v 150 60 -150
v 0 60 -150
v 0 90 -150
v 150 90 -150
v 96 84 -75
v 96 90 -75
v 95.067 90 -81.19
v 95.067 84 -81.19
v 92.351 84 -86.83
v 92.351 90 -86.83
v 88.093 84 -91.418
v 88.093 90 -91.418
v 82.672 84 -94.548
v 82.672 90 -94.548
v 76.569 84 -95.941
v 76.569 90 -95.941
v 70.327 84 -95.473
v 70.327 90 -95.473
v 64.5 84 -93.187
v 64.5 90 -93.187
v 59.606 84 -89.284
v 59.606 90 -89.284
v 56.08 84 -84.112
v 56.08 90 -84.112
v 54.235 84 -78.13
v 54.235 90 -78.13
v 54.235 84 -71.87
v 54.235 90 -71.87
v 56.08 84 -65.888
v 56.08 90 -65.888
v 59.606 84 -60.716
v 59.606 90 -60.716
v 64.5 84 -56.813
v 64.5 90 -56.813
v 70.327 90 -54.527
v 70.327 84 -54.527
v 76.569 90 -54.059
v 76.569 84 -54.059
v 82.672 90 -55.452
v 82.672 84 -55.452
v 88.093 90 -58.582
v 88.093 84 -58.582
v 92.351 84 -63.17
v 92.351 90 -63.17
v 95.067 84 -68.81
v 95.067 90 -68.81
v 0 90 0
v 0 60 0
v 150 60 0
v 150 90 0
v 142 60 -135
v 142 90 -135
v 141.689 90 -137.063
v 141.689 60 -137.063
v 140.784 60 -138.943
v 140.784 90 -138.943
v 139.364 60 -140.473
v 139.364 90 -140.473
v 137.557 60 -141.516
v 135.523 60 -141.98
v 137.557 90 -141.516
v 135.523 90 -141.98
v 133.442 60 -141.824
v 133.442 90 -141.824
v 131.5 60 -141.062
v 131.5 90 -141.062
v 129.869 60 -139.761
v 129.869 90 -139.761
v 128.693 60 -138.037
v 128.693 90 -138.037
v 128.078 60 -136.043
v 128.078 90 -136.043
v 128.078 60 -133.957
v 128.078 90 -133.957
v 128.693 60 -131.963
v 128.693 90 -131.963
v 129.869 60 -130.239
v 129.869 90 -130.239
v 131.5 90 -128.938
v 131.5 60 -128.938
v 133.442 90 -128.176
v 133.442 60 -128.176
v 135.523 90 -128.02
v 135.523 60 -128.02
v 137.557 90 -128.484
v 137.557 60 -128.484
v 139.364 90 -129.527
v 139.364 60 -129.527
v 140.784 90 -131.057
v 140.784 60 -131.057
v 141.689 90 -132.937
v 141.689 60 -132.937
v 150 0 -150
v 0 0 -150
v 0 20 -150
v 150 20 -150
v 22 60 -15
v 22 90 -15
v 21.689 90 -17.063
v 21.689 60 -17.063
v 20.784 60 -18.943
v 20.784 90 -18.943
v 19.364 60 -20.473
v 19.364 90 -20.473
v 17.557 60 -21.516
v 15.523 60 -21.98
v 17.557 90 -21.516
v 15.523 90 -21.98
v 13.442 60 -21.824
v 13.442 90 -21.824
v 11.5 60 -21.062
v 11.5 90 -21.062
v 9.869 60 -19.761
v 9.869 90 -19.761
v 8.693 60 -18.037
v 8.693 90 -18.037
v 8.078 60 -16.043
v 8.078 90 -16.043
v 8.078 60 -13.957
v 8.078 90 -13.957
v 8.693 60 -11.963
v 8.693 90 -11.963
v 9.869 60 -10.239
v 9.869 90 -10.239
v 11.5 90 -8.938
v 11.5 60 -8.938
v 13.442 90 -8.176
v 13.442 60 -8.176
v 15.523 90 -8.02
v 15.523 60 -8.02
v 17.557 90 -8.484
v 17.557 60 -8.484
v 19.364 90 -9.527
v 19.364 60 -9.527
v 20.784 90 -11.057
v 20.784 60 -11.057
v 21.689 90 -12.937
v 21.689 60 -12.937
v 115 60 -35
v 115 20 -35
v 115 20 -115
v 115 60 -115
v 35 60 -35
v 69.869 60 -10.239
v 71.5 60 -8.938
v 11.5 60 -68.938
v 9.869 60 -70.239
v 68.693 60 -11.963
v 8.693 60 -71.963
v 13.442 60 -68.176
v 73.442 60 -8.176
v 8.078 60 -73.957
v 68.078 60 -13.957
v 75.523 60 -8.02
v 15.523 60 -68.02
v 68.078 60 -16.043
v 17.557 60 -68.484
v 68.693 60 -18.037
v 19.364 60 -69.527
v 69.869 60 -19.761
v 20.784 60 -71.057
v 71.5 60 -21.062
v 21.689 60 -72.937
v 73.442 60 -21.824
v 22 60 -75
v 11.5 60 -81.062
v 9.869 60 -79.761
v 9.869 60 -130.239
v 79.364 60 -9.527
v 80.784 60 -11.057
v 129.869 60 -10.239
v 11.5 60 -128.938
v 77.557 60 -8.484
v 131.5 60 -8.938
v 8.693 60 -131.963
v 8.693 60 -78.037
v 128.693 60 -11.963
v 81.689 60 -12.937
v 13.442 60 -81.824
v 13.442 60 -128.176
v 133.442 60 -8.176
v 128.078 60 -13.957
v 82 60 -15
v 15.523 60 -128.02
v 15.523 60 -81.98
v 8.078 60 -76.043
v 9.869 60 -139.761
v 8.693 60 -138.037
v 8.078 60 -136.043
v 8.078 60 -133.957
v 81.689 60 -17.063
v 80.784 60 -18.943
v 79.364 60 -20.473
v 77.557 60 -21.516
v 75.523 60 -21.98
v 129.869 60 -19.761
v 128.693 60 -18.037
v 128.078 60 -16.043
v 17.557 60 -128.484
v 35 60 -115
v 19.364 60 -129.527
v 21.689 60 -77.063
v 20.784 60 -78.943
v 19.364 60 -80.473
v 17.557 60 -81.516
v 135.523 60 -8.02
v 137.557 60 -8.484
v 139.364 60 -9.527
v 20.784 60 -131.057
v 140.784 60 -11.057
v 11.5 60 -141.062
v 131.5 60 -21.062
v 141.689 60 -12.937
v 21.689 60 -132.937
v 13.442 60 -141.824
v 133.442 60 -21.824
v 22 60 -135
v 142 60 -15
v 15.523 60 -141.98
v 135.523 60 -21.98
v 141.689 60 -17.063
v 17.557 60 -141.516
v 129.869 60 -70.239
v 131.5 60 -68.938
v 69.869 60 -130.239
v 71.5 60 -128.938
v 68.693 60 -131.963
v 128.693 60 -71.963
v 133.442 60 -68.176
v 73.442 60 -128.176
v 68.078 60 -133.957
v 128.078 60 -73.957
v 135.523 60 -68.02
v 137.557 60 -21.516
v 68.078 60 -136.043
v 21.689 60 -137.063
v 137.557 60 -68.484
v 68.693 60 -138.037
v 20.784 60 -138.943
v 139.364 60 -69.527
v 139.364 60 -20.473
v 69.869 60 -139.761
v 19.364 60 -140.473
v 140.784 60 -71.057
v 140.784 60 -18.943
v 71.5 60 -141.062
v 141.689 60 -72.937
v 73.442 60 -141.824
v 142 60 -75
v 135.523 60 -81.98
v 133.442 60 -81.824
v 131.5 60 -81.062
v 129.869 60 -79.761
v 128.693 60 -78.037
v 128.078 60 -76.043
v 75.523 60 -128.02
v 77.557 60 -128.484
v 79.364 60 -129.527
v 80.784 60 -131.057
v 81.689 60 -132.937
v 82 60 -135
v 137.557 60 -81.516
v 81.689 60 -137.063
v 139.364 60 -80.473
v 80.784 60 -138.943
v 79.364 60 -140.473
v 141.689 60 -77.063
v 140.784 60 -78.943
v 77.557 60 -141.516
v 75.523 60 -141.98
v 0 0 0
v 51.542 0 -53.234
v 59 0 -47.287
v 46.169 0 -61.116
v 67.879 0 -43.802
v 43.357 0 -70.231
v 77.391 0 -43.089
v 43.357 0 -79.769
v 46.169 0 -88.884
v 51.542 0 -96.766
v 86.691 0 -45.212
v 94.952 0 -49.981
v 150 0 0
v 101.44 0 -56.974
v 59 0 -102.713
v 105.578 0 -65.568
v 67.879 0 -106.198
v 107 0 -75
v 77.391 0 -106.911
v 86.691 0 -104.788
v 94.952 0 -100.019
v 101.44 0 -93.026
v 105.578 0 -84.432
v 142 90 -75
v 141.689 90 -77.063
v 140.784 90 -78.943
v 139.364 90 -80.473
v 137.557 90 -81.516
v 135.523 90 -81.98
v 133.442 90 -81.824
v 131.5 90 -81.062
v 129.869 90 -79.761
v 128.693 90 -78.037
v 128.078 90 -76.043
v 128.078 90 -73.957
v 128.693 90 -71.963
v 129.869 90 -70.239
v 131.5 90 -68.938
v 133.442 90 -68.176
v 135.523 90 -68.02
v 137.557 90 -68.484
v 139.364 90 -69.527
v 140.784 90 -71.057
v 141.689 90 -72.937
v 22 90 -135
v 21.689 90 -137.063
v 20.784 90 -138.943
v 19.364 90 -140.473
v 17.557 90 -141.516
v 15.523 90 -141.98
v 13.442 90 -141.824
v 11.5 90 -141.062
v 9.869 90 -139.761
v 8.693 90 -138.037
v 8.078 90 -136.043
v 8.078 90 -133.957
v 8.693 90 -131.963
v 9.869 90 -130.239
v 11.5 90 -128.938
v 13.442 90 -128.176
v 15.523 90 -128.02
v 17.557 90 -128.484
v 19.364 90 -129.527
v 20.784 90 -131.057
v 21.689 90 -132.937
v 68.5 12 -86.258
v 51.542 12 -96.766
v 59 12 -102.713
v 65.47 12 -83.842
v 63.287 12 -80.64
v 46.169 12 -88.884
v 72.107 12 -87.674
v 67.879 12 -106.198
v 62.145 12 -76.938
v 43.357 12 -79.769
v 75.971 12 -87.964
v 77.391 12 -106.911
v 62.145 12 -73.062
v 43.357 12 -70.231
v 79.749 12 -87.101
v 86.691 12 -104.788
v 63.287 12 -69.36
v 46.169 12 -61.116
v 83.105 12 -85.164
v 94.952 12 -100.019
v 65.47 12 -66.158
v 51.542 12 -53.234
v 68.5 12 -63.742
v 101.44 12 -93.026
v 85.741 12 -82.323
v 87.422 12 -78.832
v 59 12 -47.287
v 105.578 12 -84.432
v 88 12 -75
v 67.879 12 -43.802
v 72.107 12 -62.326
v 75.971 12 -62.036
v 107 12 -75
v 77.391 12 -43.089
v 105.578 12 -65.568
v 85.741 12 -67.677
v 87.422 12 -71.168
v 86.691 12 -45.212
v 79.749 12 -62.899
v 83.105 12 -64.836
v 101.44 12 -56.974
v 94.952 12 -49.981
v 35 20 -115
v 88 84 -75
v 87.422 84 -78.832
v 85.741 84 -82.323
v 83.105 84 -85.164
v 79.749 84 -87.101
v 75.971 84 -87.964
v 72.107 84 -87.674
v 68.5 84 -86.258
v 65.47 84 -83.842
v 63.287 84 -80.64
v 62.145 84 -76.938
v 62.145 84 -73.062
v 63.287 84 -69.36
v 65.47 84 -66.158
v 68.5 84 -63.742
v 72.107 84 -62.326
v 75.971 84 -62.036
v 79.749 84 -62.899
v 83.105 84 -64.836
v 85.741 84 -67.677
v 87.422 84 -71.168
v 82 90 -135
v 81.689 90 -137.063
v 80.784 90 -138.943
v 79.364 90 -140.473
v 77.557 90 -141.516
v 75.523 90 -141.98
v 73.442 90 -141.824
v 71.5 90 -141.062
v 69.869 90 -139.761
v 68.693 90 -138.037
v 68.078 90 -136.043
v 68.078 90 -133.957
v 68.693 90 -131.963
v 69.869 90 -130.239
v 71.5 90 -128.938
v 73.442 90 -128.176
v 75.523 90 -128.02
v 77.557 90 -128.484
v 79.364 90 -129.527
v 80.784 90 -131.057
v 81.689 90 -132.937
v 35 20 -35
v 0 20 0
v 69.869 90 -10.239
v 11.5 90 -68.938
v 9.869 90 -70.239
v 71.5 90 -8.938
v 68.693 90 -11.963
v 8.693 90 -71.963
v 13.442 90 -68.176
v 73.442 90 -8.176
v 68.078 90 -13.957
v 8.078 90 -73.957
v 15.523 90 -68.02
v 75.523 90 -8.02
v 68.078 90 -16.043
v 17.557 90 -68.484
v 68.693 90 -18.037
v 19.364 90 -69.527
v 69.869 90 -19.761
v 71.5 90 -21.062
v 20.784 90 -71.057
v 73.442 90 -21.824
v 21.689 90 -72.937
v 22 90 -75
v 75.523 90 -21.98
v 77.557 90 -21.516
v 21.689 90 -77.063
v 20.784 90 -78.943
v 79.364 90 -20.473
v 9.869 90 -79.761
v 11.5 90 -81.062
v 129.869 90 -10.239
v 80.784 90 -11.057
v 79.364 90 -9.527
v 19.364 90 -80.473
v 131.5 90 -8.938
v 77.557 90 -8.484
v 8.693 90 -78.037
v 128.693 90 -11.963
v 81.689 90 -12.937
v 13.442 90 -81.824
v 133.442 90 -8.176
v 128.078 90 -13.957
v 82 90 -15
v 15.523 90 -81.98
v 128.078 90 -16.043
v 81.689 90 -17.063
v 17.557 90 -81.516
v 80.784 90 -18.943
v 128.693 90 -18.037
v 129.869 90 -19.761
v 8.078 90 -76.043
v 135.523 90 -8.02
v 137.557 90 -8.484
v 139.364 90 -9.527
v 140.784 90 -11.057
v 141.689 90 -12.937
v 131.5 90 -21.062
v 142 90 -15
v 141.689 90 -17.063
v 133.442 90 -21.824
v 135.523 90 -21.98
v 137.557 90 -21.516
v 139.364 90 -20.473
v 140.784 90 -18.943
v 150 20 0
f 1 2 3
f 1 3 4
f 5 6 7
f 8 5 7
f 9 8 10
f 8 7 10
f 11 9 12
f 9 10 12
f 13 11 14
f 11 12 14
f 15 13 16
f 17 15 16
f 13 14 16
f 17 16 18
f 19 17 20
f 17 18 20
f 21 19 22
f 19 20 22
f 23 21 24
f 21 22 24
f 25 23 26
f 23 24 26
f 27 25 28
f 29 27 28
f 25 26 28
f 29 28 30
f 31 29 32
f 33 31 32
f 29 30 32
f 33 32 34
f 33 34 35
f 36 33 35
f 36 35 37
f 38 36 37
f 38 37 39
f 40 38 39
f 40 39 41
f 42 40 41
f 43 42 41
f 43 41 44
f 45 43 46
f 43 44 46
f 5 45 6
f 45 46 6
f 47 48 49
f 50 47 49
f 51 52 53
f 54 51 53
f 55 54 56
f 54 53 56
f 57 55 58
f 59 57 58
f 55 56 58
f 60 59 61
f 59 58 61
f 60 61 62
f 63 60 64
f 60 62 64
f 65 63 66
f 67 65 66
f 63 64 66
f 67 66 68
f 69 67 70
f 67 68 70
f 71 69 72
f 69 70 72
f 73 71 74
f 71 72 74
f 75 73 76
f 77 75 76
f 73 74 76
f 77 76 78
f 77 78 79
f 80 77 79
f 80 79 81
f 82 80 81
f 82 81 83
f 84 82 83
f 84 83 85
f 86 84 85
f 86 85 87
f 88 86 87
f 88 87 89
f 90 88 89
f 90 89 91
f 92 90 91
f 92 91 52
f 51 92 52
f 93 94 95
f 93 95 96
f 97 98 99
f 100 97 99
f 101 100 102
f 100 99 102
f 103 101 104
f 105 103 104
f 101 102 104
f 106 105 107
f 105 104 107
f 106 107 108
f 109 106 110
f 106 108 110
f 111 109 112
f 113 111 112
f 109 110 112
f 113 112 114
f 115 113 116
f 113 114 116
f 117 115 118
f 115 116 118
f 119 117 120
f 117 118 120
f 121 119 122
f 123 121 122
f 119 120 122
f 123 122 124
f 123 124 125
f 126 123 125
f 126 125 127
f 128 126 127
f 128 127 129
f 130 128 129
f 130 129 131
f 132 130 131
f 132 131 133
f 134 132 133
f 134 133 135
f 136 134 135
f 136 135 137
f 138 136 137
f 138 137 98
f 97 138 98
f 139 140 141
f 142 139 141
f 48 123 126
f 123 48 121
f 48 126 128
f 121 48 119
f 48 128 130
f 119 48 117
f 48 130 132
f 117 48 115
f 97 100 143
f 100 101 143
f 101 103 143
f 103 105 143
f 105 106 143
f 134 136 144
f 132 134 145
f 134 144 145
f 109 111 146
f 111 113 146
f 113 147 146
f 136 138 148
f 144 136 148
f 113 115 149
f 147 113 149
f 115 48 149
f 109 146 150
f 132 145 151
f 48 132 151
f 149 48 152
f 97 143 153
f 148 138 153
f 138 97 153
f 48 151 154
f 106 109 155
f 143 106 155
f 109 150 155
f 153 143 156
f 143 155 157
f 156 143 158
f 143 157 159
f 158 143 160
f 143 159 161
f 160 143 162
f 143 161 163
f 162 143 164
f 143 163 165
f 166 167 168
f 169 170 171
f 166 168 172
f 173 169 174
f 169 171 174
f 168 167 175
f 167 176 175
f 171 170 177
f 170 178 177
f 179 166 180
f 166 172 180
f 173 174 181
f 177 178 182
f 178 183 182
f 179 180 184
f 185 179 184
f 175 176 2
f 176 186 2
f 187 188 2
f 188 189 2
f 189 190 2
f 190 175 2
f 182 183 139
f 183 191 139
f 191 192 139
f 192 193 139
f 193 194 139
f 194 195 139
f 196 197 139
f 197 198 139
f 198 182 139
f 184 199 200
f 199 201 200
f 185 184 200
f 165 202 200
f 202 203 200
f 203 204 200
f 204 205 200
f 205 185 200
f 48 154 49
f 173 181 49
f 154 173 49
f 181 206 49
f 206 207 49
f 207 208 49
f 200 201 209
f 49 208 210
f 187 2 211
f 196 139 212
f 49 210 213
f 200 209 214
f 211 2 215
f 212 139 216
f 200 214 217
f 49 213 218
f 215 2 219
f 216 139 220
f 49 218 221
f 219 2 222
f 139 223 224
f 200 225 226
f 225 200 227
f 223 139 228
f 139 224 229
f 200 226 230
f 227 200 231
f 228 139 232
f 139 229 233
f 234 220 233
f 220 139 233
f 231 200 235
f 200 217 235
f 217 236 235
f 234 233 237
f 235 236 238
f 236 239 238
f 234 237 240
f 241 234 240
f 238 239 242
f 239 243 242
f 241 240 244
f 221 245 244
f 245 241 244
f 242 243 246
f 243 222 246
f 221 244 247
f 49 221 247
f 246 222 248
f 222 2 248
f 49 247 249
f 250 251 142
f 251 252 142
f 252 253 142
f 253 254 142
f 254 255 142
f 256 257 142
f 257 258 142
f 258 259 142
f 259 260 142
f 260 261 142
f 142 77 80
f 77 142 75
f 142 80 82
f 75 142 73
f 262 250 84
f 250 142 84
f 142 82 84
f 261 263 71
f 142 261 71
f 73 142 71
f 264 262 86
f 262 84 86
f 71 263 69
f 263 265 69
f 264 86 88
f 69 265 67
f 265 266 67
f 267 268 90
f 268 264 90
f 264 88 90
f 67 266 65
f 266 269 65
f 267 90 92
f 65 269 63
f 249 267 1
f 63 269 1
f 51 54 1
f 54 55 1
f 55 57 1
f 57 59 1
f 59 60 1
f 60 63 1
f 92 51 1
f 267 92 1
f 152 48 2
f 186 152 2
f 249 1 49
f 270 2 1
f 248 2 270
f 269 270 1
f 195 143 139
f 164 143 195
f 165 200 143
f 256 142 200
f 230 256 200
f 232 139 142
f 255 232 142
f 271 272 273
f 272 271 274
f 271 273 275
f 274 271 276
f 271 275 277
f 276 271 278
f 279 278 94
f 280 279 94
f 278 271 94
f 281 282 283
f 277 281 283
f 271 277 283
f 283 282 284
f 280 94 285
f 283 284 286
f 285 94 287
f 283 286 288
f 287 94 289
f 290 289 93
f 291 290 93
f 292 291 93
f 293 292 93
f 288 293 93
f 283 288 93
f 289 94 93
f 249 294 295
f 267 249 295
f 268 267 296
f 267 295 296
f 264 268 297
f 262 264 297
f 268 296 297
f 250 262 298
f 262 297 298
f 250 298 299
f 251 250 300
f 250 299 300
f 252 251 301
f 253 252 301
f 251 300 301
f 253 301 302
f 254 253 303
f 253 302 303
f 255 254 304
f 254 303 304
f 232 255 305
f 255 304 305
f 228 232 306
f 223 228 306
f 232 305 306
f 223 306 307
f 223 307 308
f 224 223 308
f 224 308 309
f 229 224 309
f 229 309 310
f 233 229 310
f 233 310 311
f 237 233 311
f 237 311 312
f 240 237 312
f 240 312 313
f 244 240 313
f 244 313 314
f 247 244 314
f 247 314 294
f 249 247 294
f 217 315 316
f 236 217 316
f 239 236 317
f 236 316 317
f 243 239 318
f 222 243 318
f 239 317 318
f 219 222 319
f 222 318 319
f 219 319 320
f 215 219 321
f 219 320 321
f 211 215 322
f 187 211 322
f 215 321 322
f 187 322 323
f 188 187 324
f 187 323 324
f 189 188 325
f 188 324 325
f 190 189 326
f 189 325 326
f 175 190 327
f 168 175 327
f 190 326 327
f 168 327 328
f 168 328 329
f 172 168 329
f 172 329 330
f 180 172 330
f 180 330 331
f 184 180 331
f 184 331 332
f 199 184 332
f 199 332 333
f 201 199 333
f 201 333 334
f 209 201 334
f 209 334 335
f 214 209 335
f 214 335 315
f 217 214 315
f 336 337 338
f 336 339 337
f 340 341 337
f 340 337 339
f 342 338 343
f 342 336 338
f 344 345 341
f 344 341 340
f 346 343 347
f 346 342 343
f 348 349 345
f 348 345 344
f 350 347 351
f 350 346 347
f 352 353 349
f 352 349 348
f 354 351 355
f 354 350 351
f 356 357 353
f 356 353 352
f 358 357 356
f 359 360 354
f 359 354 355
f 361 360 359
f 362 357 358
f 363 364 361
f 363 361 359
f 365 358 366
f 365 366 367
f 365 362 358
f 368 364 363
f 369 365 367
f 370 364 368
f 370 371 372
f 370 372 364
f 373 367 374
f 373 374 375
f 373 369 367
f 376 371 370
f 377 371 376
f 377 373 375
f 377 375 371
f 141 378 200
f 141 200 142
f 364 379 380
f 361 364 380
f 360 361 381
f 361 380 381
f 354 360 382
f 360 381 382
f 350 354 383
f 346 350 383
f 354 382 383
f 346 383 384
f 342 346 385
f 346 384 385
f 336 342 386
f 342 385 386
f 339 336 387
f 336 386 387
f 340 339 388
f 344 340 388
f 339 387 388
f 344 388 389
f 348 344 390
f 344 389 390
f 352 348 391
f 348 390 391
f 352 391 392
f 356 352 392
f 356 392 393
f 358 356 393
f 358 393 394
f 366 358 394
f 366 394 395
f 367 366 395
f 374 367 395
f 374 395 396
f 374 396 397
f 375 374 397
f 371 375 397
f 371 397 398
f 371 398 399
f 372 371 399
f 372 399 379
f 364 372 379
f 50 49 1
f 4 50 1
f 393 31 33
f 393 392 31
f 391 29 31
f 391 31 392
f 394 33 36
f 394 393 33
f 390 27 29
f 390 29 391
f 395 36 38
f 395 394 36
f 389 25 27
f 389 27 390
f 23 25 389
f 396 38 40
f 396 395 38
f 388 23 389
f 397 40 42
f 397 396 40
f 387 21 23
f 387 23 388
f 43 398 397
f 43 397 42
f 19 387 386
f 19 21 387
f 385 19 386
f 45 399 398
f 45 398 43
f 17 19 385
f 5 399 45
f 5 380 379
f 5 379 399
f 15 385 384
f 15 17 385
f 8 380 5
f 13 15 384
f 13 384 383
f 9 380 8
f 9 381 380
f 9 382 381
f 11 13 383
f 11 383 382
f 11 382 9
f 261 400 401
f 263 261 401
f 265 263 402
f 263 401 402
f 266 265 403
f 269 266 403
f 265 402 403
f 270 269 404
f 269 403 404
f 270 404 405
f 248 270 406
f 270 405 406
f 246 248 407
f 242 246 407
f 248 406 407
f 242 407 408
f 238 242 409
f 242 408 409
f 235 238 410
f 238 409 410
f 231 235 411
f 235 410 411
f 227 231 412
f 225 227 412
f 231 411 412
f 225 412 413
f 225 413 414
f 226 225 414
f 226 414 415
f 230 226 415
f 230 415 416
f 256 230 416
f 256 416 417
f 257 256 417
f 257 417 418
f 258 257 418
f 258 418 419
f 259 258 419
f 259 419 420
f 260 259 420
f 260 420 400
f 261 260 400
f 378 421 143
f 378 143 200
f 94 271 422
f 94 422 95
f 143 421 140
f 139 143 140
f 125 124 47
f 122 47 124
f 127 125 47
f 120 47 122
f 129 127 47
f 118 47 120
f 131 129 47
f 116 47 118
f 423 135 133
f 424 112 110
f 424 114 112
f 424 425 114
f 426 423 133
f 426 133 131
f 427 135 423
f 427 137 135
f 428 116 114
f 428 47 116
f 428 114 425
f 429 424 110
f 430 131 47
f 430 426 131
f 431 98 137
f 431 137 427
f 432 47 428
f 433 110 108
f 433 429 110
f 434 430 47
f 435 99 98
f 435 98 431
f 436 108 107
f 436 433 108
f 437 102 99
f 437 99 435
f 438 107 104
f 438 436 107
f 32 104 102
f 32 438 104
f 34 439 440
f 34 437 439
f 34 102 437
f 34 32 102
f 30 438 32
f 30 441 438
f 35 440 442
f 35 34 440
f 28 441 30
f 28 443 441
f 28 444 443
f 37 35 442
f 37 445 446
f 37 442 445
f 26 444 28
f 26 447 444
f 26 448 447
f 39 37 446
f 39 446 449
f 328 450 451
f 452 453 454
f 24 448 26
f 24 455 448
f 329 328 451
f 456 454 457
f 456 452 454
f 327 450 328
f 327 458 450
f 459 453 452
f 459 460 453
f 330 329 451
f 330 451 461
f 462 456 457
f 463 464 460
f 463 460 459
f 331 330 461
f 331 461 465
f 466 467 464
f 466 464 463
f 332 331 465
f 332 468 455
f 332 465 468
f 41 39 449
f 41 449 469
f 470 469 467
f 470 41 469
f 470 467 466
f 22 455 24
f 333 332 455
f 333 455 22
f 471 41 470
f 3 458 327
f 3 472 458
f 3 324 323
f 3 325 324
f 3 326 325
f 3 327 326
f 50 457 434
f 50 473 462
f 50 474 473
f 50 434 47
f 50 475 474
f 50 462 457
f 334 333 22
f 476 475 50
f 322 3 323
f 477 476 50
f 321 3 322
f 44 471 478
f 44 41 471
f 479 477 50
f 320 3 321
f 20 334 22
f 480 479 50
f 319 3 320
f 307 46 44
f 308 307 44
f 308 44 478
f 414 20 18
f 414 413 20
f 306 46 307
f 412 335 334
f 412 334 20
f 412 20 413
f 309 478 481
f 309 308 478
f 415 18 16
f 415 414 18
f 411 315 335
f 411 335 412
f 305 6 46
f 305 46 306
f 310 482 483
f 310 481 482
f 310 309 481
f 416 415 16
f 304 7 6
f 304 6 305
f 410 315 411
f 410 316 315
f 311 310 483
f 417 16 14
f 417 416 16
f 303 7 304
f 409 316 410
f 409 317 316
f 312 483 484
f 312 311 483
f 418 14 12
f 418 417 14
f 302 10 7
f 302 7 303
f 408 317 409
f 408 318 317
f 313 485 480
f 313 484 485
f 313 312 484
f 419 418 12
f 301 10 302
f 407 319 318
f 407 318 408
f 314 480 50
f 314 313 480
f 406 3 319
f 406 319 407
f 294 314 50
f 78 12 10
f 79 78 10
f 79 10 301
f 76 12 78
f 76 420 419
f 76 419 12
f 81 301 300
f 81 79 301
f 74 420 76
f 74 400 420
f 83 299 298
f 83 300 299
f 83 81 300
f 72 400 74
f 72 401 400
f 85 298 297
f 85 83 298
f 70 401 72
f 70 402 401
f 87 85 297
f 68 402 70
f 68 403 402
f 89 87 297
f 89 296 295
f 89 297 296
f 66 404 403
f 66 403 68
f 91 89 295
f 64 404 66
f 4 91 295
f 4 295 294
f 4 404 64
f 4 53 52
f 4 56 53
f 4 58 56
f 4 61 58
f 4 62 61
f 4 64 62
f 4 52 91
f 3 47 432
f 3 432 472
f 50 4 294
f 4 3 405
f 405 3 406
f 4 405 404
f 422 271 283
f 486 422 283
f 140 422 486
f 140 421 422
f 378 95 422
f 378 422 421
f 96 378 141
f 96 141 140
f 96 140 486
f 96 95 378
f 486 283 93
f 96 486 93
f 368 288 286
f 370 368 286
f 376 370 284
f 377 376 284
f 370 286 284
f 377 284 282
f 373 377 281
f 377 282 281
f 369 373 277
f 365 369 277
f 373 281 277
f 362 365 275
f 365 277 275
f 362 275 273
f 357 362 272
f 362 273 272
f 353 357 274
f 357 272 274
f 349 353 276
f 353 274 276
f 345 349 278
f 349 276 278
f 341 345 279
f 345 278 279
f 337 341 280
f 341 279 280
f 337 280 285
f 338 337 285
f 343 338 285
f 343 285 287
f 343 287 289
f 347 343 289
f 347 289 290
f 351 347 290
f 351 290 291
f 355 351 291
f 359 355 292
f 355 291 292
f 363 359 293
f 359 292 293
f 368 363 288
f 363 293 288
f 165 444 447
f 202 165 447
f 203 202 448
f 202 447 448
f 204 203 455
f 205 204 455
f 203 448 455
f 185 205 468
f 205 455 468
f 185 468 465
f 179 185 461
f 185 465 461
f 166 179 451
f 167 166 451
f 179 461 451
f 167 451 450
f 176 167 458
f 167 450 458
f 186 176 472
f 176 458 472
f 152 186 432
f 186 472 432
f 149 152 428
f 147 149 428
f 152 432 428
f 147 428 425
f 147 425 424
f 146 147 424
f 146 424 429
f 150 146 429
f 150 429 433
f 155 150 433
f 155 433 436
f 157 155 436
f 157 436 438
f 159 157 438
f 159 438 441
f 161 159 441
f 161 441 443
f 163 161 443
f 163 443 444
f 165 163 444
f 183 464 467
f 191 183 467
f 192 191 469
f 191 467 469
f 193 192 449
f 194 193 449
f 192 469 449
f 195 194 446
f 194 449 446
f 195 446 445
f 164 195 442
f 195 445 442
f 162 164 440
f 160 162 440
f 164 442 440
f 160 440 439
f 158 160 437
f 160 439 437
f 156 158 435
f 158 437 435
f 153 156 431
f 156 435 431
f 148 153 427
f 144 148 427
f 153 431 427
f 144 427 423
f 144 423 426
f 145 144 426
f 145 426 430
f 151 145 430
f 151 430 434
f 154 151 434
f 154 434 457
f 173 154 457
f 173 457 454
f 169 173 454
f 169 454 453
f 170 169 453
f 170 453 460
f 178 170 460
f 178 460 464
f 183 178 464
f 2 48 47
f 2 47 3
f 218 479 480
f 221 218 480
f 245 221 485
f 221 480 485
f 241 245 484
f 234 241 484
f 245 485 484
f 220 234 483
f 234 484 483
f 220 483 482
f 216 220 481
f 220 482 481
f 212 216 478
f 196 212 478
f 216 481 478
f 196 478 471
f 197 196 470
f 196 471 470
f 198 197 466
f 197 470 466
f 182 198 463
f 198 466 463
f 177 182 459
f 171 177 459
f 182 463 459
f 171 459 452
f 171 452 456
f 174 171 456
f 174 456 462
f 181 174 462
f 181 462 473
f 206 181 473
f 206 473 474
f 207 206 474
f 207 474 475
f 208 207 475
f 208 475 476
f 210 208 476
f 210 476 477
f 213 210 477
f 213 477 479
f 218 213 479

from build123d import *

# Parameters (mm, degrees)
SKETCH2_W           = 150
SKETCH2_H           = 150
BOSS_EXTRUDE1_DEPTH = 20
SKETCH4_W           = 80
SKETCH4_H           = 80
BOSS_EXTRUDE2_DEPTH = 40
SKETCH5_W           = 150
SKETCH5_H           = 150
BOSS_EXTRUDE3_DEPTH = 30
SKETCH6_R           = 13
CUT_EXTRUDE1_DEPTH  = 168
SKETCH7_R           = 21
CUT_EXTRUDE2_DEPTH  = 6
SKETCH8_R           = 32
CUT_EXTRUDE3_DEPTH  = 12
SKETCH9_R           = 7
CUT_EXTRUDE4_DEPTH  = 52


with BuildPart() as part:
    # Sketch2 → Boss-Extrude1 (new body)
    with BuildSketch(Plane(origin=(0, 0, 0), x_dir=(1, 0, 0), z_dir=(0, 1, 0))):
        with Locations((75, 75)):
            Rectangle(SKETCH2_W, SKETCH2_H)
    extrude(amount=BOSS_EXTRUDE1_DEPTH)

    # Sketch4 → Boss-Extrude2 (add)
    with BuildSketch(Plane(origin=(0, 20, 0), x_dir=(1, 0, 0), z_dir=(0, 1, 0))):
        with Locations((75, 75)):
            Rectangle(SKETCH4_W, SKETCH4_H)
    extrude(amount=BOSS_EXTRUDE2_DEPTH)

    # Sketch5 → Boss-Extrude3 (add)
    with BuildSketch(Plane(origin=(0, 60, 0), x_dir=(1, 0, 0), z_dir=(0, 1, 0))):
        with Locations((75, 75)):
            Rectangle(SKETCH5_W, SKETCH5_H)
    extrude(amount=BOSS_EXTRUDE3_DEPTH)

    # Sketch6 → Cut-Extrude1 (cut)
    with BuildSketch(Plane(origin=(0, 90, 0), x_dir=(1, 0, 0), z_dir=(0, 1, 0))):
        with Locations((75, 75)):
            Circle(SKETCH6_R)
    extrude(amount=-CUT_EXTRUDE1_DEPTH, mode=Mode.SUBTRACT)

    # Sketch7 → Cut-Extrude2 (cut)
    with BuildSketch(Plane(origin=(0, 90, 0), x_dir=(1, 0, 0), z_dir=(0, 1, 0))):
        with Locations((75, 75)):
            Circle(SKETCH7_R)
    extrude(amount=-CUT_EXTRUDE2_DEPTH, mode=Mode.SUBTRACT)

    # Sketch8 → Cut-Extrude3 (cut)
    with BuildSketch(Plane.XZ):
        with Locations((75, -75)):
            Circle(SKETCH8_R)
    extrude(amount=-CUT_EXTRUDE3_DEPTH, mode=Mode.SUBTRACT)

    # Sketch9 → Cut-Extrude4 (cut)
    with BuildSketch(Plane(origin=(0, 90, 0), x_dir=(1, 0, 0), z_dir=(0, 1, 0))):
        with Locations((75, 135)):
            Circle(SKETCH9_R)
        with Locations((15, 75)):
            Circle(SKETCH9_R)
        with Locations((75, 15)):
            Circle(SKETCH9_R)
        with Locations((135, 75)):
            Circle(SKETCH9_R)
        with Locations((15, 135)):
            Circle(SKETCH9_R)
        with Locations((135, 135)):
            Circle(SKETCH9_R)
        with Locations((135, 15)):
            Circle(SKETCH9_R)
        with Locations((15, 15)):
            Circle(SKETCH9_R)
    extrude(amount=-CUT_EXTRUDE4_DEPTH, mode=Mode.SUBTRACT)


solid = part.part
